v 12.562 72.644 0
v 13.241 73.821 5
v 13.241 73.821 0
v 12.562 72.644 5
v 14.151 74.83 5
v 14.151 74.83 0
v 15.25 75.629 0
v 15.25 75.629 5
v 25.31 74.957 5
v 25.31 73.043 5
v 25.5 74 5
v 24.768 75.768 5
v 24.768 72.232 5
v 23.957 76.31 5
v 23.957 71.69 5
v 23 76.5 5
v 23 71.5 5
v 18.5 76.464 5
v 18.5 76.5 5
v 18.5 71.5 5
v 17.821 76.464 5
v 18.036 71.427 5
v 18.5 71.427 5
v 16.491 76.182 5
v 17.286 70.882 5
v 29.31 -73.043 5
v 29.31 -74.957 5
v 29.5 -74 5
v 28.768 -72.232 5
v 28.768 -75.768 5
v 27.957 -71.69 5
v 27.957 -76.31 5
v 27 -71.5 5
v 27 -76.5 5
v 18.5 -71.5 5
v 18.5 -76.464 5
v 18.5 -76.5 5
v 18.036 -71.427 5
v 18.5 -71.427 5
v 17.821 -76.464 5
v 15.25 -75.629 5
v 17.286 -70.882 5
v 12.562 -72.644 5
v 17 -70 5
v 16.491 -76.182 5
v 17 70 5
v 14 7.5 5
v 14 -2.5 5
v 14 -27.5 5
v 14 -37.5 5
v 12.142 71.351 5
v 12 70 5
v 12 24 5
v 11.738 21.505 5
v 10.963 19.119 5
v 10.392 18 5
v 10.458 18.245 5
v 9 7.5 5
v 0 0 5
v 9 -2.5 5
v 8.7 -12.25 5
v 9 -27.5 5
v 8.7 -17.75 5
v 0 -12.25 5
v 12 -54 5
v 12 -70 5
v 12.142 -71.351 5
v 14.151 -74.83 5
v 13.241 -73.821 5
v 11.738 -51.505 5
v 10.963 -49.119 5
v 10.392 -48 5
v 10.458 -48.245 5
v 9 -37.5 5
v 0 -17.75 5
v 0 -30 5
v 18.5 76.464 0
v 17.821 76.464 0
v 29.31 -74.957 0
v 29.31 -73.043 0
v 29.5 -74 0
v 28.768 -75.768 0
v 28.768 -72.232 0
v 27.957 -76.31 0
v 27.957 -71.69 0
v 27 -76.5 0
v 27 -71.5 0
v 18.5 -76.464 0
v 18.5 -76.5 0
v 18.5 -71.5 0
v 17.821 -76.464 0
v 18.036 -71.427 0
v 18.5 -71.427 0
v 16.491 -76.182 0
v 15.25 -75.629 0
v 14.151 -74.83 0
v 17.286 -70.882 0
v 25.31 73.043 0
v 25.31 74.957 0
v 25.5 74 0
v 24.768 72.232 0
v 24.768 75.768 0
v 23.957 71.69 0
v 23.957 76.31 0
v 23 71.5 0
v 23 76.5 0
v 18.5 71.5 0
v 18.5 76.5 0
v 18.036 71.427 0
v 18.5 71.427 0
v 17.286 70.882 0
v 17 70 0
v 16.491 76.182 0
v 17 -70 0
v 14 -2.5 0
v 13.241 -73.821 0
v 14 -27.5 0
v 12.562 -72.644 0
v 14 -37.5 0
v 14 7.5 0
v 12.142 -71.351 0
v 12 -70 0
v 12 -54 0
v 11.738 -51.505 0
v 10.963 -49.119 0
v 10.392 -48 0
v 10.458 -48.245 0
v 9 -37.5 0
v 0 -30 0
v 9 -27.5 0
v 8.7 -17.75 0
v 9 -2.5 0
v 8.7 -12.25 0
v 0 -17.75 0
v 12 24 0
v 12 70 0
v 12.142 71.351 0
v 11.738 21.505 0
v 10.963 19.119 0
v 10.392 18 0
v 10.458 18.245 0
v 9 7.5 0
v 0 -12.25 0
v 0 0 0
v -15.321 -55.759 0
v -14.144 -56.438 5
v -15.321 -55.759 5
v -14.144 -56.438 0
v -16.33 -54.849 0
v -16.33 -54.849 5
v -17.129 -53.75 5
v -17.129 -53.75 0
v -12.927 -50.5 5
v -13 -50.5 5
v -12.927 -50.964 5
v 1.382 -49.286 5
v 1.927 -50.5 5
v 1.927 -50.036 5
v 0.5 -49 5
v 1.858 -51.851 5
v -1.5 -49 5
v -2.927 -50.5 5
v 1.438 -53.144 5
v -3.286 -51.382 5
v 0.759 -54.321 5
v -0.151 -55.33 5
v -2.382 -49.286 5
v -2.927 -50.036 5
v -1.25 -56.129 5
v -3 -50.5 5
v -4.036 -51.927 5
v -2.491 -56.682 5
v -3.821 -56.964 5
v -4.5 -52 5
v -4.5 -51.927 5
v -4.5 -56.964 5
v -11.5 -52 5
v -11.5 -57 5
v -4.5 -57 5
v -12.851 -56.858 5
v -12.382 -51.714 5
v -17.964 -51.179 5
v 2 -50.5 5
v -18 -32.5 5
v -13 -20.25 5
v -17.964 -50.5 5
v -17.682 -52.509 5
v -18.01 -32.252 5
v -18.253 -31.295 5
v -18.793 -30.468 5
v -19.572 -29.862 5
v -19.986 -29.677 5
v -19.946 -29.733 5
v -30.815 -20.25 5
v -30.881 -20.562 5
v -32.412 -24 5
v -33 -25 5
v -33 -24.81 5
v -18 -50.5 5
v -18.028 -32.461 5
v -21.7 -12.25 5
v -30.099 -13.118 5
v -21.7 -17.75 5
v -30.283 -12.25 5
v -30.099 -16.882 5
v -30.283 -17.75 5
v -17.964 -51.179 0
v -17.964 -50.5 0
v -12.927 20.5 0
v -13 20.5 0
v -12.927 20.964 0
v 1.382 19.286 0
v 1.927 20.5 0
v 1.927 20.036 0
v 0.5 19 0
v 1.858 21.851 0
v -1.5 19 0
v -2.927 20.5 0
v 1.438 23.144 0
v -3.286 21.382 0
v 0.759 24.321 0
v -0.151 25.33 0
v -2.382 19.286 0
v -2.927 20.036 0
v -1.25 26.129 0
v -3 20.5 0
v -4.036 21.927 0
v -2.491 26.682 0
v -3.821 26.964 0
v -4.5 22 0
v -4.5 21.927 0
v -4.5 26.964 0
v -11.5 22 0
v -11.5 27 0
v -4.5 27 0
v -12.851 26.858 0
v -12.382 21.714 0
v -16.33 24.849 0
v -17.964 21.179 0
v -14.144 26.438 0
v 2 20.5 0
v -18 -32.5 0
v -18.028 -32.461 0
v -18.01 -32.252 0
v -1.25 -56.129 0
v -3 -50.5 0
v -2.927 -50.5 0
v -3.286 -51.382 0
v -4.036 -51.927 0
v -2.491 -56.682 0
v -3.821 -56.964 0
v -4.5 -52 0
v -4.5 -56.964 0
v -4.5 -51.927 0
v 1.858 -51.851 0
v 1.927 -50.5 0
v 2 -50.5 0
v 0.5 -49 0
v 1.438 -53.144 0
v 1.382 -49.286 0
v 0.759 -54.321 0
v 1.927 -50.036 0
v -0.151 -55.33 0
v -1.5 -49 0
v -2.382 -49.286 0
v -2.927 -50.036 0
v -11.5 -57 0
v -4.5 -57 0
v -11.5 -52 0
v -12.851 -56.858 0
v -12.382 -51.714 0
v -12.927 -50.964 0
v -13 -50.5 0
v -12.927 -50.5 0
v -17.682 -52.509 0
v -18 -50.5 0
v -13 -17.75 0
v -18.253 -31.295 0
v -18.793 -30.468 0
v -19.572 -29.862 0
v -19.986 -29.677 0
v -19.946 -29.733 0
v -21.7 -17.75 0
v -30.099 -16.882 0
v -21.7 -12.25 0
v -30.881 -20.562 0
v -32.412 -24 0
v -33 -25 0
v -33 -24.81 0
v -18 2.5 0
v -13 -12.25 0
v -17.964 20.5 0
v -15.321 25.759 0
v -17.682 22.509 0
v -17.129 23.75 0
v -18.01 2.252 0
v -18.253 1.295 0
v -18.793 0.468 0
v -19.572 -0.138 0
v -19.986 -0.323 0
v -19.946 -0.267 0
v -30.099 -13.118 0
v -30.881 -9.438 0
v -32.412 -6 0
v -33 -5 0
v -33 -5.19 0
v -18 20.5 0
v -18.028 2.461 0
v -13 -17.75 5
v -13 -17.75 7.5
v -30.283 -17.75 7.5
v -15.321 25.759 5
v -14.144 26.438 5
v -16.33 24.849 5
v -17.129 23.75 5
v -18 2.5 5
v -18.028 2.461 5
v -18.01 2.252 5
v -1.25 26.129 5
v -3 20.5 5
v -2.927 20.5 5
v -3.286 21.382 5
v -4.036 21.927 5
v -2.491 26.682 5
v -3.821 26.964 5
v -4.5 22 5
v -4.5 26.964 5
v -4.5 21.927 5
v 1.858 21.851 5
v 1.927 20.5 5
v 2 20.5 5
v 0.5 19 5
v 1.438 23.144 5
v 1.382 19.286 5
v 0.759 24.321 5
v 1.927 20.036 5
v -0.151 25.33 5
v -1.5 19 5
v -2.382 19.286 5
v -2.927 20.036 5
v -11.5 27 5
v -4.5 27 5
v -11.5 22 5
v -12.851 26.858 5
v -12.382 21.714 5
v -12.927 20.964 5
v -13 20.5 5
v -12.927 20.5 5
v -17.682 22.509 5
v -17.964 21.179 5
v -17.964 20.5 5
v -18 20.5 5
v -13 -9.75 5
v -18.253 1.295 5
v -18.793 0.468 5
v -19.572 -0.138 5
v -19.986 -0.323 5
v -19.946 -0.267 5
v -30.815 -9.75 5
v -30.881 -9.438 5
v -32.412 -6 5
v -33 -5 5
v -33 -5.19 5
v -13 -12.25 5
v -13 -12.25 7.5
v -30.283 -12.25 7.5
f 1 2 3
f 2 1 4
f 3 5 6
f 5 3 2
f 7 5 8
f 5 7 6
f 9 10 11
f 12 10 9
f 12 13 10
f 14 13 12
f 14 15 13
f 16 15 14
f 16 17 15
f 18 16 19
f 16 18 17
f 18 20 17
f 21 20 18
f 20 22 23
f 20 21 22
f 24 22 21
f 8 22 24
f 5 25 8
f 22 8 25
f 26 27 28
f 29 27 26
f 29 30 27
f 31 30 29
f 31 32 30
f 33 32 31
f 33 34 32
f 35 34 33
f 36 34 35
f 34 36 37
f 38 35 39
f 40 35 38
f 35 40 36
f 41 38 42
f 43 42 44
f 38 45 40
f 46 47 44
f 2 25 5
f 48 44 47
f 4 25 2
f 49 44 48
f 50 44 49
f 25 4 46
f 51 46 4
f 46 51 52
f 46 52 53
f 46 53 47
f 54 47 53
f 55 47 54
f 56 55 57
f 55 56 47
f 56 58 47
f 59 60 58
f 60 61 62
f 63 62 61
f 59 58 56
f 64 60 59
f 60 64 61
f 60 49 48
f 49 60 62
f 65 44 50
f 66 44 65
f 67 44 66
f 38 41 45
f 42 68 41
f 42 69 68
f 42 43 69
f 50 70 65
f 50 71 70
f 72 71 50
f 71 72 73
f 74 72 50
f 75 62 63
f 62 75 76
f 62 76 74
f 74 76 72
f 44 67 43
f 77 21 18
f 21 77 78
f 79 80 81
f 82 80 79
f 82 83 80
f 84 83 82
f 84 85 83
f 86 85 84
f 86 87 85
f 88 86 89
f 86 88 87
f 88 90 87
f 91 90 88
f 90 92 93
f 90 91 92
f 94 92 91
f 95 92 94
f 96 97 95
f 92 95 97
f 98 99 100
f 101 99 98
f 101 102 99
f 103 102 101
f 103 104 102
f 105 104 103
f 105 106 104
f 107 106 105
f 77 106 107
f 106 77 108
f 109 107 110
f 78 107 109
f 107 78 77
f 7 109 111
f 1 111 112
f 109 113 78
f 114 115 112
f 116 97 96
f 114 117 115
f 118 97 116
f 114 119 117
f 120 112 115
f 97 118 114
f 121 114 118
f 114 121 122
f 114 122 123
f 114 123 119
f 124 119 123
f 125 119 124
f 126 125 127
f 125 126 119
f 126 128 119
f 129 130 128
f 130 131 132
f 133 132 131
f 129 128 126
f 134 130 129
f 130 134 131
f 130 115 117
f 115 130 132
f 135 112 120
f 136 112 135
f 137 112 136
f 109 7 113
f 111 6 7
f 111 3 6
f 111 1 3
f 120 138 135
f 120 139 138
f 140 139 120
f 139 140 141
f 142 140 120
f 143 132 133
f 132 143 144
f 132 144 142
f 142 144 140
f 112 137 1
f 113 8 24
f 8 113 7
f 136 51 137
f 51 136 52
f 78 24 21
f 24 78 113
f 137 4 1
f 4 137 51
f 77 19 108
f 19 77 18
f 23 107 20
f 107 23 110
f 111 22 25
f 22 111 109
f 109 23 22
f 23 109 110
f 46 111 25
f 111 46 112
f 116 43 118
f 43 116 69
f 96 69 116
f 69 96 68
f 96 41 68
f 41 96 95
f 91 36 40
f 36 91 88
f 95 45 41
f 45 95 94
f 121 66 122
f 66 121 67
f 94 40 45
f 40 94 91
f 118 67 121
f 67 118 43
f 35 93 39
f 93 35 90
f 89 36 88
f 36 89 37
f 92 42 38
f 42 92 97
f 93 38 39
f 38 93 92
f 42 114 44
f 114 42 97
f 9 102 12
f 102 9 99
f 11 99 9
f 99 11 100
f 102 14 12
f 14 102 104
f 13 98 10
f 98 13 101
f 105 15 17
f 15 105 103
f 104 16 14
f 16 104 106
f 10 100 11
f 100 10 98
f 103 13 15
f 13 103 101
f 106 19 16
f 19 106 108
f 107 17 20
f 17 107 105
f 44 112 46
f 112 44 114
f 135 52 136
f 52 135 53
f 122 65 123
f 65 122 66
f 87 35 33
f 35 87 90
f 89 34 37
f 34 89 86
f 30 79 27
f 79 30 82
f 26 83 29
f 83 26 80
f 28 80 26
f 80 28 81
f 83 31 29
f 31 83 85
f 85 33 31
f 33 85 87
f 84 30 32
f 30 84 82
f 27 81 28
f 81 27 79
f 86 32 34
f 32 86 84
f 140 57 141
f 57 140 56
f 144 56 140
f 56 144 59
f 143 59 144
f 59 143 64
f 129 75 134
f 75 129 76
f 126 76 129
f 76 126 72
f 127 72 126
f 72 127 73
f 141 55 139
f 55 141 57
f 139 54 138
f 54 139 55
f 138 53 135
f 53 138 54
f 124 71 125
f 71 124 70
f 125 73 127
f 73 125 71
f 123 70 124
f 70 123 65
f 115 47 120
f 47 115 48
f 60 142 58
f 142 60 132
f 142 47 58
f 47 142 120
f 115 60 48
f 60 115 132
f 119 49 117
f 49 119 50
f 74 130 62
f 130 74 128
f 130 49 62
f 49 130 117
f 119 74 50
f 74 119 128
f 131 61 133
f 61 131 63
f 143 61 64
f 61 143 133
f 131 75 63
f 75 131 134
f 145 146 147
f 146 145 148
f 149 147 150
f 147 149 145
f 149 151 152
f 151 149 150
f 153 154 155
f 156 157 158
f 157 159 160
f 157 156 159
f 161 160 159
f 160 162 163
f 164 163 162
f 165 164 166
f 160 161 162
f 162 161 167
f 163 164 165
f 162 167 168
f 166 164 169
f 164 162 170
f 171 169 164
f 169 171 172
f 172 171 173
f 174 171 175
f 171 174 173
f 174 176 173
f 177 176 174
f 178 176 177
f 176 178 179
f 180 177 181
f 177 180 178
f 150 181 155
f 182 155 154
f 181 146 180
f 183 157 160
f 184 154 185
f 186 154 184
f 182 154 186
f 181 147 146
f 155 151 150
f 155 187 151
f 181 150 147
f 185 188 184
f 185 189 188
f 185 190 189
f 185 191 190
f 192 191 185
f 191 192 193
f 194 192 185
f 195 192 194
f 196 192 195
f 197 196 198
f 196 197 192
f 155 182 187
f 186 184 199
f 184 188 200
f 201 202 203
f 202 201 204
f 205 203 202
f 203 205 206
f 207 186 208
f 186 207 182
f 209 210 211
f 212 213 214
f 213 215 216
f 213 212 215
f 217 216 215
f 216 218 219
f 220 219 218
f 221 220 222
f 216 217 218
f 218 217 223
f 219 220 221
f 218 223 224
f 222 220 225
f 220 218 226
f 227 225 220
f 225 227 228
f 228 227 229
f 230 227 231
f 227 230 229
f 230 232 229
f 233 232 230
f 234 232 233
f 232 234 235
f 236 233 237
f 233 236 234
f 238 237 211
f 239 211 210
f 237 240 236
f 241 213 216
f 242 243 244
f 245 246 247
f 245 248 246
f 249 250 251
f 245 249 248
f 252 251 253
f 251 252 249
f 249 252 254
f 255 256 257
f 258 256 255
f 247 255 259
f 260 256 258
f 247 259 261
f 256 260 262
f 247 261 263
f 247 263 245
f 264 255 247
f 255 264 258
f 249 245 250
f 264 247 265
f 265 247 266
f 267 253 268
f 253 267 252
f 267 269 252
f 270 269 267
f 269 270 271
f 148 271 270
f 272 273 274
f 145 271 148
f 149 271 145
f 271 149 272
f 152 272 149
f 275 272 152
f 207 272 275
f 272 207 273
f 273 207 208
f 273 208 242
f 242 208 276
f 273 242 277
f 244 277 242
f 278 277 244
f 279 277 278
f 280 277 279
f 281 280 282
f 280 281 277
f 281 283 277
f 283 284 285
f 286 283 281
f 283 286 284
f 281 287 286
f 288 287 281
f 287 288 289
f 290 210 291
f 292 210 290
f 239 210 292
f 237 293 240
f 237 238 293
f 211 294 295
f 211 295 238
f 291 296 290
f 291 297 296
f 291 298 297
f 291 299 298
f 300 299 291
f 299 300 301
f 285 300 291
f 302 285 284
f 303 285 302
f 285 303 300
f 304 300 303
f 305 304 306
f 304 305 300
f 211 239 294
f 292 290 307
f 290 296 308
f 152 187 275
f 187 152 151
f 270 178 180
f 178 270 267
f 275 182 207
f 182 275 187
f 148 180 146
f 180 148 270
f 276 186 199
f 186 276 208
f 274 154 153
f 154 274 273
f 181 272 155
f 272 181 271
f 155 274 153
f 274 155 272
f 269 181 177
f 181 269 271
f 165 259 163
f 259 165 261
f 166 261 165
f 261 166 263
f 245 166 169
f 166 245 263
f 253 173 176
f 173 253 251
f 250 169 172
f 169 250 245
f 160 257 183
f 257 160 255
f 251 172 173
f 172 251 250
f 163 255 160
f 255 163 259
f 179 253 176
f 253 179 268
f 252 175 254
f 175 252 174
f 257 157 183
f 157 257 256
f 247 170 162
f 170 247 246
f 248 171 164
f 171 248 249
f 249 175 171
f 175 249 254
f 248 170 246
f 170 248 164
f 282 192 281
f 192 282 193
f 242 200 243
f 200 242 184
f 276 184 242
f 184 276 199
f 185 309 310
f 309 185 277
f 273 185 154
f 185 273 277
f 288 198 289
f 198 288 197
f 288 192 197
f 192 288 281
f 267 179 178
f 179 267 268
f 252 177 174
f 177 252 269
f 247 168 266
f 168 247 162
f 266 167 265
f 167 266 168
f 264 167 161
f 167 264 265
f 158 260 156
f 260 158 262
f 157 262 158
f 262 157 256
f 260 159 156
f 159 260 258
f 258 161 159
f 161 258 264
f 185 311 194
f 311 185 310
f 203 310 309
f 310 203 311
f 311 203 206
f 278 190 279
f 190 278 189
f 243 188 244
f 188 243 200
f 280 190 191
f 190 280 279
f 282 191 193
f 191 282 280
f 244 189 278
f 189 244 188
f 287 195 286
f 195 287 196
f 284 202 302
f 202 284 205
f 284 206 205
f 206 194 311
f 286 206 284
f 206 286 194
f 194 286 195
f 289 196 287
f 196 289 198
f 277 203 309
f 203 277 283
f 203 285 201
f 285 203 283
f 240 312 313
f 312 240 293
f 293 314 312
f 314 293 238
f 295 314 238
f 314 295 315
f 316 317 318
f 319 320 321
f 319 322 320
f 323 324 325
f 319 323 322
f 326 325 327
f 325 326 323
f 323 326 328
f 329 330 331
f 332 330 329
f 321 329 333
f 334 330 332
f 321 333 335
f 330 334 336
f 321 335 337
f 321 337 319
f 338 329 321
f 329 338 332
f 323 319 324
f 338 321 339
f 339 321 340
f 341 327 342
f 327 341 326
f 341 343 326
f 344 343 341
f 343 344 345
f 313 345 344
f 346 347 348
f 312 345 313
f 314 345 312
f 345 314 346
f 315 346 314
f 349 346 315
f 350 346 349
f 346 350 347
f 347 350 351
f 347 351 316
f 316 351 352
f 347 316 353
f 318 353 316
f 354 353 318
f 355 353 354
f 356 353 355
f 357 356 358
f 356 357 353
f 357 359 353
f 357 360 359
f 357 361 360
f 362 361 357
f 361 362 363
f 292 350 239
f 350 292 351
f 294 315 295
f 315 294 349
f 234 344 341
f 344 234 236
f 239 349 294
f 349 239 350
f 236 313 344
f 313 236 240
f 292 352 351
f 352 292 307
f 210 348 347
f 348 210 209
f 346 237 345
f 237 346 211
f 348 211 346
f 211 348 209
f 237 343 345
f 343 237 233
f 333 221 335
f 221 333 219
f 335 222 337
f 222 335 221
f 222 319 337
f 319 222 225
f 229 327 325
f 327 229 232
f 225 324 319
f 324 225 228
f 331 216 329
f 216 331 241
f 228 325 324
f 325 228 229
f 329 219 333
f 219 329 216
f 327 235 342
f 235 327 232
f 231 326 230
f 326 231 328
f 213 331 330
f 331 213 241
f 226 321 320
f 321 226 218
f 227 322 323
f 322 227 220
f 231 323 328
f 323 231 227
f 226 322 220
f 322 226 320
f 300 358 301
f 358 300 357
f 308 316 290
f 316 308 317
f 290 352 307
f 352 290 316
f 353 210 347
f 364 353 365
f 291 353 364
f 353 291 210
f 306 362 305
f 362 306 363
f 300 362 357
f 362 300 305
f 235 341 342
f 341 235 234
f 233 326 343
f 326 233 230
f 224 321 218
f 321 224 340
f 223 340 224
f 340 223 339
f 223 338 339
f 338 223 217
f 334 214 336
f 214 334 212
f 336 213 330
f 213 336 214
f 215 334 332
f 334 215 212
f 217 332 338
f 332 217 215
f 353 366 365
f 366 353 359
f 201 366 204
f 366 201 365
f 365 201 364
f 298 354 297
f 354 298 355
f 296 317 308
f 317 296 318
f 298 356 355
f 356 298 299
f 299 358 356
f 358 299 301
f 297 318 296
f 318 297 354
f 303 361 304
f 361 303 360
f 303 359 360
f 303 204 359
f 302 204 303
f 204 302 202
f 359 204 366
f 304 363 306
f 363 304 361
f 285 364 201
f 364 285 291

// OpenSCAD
// Depending on your printer, you should add an extra 1 to 2 mm.
Phone_Length=143;
// Depending on your printer, you should add an extra 1 to 2 mm.
Phone_Width=74;
// Depending on your printer, you should add an extra 1 to 2 mm.
Phone_Thickness = 10;

// Diameter of the bar where the holder is to be mounted.
Handle_Bar_Diameter = 36;
// Distance from the handle bar to the back of the phone. A smaller number will give a lower profile.
Holder_Height = 17; // [11:17]
// Offset from the center on the vertical part
Vertical_Offset = -15;

/* [Hidden] */
$fs = 1;

module copy_mirror(vec=[0,1,0]) {
 union() {
  children();
  mirror(vec) children();
 }
};

module rounded_corner(vec=[0,0,0],rot=0) {
 translate(vec) rotate([0,0,rot]) difference(){
  intersection(){
   cylinder(r=6.5,h=5);
   translate([-6.5,0,0]) cube([6.5,6.5,5]);
  };
  cylinder(r=1.5,h=5);
 };
};

// Vertical Piece
//translate([2.5,0,0]) rotate([0,-90,0]) difference(){
difference(){
 union(){
  translate([23,Phone_Length/2+2.5,0]) cylinder(r=2.5,h=5);
  translate([18.5,Phone_Length/2,0]) cube([4.5,5,5]);
  copy_mirror([0,1,0]) rounded_corner([18.5,Phone_Length/2-1.5,0]);
  translate([12,-Phone_Length/2+1.5,0]) cube([5,Phone_Length-3,5]);
  translate([18.5,-Phone_Length/2-5,0]) cube([Phone_Thickness-1.5,5,5]);
  translate([17+Phone_Thickness,-Phone_Length/2-2.5,0]) cylinder(r=2.5,h=5);
  linear_extrude(height=5) polygon([[12,-39+Vertical_Offset],[12,39+Vertical_Offset],[10.3923,33+Vertical_Offset],[0,15+Vertical_Offset],[0,-15+Vertical_Offset],[10.3923,-33+Vertical_Offset]]);
 };
 translate([0, Vertical_Offset, 0]) copy_mirror([0,1,0]) translate([0,39,0]) cylinder(r=12,h=5);
 translate([0, Vertical_Offset, 0]) copy_mirror([0,1,0]) translate([9,12.5,0]) cube([5,10,5]);
 translate([17-Holder_Height,-5.5/2 + Vertical_Offset,0]) cube([Holder_Height/2+0.2,5.5,5]);
 translate([-Holder_Height,-30,0]) cube([17,60,5]);
};

// Horizontal Piece
//translate([0,2.5,0]) rotate([90,0,0]) copy_mirror([1,0,0]) difference(){
translate([-30,Vertical_Offset,0]) rotate([0,0,-90]) copy_mirror([1,0,0]) difference(){
 union(){
  linear_extrude(height=5) polygon([[0,-3],[10,-3],[14.6768,10.0145],[17.5,12],[Phone_Width/2-1.5,12],[Phone_Width/2-1.5,17],[0,17]]);
  rounded_corner([Phone_Width/2-1.5,18.5,0],180);
  translate([Phone_Width/2,18.5,0]) cube([5,Phone_Thickness-3,5]);
  rounded_corner([Phone_Width/2-1.5,17+Phone_Thickness-1.5,0],-90);
  translate([Phone_Width/2-1.5,17+Phone_Thickness+1.5,0]) cylinder(r=1.5,h=5);
  translate([Phone_Width/2-1.5,17+Phone_Thickness+5-1.5,0]) cylinder(r=1.5,h=5);
  translate([Phone_Width/2-3,17+Phone_Thickness+1.5,0]) cube([1.5,2,5]);
  translate([5.5/2,17,5/2]) rotate([90,0,0]) linear_extrude(height=20) polygon([[0,0],[5,0],[0,5]]);
 };
 translate([17.5,9,0]) cylinder(r=3,h=5);
 translate([0,-Handle_Bar_Diameter/2-Holder_Height+17,0]) cylinder(r=Handle_Bar_Diameter/2,h=10);
 translate([-5.5/2,17-(Holder_Height/2+0.2),0]) cube([5.5,Holder_Height/2+0.2,5]);
};
